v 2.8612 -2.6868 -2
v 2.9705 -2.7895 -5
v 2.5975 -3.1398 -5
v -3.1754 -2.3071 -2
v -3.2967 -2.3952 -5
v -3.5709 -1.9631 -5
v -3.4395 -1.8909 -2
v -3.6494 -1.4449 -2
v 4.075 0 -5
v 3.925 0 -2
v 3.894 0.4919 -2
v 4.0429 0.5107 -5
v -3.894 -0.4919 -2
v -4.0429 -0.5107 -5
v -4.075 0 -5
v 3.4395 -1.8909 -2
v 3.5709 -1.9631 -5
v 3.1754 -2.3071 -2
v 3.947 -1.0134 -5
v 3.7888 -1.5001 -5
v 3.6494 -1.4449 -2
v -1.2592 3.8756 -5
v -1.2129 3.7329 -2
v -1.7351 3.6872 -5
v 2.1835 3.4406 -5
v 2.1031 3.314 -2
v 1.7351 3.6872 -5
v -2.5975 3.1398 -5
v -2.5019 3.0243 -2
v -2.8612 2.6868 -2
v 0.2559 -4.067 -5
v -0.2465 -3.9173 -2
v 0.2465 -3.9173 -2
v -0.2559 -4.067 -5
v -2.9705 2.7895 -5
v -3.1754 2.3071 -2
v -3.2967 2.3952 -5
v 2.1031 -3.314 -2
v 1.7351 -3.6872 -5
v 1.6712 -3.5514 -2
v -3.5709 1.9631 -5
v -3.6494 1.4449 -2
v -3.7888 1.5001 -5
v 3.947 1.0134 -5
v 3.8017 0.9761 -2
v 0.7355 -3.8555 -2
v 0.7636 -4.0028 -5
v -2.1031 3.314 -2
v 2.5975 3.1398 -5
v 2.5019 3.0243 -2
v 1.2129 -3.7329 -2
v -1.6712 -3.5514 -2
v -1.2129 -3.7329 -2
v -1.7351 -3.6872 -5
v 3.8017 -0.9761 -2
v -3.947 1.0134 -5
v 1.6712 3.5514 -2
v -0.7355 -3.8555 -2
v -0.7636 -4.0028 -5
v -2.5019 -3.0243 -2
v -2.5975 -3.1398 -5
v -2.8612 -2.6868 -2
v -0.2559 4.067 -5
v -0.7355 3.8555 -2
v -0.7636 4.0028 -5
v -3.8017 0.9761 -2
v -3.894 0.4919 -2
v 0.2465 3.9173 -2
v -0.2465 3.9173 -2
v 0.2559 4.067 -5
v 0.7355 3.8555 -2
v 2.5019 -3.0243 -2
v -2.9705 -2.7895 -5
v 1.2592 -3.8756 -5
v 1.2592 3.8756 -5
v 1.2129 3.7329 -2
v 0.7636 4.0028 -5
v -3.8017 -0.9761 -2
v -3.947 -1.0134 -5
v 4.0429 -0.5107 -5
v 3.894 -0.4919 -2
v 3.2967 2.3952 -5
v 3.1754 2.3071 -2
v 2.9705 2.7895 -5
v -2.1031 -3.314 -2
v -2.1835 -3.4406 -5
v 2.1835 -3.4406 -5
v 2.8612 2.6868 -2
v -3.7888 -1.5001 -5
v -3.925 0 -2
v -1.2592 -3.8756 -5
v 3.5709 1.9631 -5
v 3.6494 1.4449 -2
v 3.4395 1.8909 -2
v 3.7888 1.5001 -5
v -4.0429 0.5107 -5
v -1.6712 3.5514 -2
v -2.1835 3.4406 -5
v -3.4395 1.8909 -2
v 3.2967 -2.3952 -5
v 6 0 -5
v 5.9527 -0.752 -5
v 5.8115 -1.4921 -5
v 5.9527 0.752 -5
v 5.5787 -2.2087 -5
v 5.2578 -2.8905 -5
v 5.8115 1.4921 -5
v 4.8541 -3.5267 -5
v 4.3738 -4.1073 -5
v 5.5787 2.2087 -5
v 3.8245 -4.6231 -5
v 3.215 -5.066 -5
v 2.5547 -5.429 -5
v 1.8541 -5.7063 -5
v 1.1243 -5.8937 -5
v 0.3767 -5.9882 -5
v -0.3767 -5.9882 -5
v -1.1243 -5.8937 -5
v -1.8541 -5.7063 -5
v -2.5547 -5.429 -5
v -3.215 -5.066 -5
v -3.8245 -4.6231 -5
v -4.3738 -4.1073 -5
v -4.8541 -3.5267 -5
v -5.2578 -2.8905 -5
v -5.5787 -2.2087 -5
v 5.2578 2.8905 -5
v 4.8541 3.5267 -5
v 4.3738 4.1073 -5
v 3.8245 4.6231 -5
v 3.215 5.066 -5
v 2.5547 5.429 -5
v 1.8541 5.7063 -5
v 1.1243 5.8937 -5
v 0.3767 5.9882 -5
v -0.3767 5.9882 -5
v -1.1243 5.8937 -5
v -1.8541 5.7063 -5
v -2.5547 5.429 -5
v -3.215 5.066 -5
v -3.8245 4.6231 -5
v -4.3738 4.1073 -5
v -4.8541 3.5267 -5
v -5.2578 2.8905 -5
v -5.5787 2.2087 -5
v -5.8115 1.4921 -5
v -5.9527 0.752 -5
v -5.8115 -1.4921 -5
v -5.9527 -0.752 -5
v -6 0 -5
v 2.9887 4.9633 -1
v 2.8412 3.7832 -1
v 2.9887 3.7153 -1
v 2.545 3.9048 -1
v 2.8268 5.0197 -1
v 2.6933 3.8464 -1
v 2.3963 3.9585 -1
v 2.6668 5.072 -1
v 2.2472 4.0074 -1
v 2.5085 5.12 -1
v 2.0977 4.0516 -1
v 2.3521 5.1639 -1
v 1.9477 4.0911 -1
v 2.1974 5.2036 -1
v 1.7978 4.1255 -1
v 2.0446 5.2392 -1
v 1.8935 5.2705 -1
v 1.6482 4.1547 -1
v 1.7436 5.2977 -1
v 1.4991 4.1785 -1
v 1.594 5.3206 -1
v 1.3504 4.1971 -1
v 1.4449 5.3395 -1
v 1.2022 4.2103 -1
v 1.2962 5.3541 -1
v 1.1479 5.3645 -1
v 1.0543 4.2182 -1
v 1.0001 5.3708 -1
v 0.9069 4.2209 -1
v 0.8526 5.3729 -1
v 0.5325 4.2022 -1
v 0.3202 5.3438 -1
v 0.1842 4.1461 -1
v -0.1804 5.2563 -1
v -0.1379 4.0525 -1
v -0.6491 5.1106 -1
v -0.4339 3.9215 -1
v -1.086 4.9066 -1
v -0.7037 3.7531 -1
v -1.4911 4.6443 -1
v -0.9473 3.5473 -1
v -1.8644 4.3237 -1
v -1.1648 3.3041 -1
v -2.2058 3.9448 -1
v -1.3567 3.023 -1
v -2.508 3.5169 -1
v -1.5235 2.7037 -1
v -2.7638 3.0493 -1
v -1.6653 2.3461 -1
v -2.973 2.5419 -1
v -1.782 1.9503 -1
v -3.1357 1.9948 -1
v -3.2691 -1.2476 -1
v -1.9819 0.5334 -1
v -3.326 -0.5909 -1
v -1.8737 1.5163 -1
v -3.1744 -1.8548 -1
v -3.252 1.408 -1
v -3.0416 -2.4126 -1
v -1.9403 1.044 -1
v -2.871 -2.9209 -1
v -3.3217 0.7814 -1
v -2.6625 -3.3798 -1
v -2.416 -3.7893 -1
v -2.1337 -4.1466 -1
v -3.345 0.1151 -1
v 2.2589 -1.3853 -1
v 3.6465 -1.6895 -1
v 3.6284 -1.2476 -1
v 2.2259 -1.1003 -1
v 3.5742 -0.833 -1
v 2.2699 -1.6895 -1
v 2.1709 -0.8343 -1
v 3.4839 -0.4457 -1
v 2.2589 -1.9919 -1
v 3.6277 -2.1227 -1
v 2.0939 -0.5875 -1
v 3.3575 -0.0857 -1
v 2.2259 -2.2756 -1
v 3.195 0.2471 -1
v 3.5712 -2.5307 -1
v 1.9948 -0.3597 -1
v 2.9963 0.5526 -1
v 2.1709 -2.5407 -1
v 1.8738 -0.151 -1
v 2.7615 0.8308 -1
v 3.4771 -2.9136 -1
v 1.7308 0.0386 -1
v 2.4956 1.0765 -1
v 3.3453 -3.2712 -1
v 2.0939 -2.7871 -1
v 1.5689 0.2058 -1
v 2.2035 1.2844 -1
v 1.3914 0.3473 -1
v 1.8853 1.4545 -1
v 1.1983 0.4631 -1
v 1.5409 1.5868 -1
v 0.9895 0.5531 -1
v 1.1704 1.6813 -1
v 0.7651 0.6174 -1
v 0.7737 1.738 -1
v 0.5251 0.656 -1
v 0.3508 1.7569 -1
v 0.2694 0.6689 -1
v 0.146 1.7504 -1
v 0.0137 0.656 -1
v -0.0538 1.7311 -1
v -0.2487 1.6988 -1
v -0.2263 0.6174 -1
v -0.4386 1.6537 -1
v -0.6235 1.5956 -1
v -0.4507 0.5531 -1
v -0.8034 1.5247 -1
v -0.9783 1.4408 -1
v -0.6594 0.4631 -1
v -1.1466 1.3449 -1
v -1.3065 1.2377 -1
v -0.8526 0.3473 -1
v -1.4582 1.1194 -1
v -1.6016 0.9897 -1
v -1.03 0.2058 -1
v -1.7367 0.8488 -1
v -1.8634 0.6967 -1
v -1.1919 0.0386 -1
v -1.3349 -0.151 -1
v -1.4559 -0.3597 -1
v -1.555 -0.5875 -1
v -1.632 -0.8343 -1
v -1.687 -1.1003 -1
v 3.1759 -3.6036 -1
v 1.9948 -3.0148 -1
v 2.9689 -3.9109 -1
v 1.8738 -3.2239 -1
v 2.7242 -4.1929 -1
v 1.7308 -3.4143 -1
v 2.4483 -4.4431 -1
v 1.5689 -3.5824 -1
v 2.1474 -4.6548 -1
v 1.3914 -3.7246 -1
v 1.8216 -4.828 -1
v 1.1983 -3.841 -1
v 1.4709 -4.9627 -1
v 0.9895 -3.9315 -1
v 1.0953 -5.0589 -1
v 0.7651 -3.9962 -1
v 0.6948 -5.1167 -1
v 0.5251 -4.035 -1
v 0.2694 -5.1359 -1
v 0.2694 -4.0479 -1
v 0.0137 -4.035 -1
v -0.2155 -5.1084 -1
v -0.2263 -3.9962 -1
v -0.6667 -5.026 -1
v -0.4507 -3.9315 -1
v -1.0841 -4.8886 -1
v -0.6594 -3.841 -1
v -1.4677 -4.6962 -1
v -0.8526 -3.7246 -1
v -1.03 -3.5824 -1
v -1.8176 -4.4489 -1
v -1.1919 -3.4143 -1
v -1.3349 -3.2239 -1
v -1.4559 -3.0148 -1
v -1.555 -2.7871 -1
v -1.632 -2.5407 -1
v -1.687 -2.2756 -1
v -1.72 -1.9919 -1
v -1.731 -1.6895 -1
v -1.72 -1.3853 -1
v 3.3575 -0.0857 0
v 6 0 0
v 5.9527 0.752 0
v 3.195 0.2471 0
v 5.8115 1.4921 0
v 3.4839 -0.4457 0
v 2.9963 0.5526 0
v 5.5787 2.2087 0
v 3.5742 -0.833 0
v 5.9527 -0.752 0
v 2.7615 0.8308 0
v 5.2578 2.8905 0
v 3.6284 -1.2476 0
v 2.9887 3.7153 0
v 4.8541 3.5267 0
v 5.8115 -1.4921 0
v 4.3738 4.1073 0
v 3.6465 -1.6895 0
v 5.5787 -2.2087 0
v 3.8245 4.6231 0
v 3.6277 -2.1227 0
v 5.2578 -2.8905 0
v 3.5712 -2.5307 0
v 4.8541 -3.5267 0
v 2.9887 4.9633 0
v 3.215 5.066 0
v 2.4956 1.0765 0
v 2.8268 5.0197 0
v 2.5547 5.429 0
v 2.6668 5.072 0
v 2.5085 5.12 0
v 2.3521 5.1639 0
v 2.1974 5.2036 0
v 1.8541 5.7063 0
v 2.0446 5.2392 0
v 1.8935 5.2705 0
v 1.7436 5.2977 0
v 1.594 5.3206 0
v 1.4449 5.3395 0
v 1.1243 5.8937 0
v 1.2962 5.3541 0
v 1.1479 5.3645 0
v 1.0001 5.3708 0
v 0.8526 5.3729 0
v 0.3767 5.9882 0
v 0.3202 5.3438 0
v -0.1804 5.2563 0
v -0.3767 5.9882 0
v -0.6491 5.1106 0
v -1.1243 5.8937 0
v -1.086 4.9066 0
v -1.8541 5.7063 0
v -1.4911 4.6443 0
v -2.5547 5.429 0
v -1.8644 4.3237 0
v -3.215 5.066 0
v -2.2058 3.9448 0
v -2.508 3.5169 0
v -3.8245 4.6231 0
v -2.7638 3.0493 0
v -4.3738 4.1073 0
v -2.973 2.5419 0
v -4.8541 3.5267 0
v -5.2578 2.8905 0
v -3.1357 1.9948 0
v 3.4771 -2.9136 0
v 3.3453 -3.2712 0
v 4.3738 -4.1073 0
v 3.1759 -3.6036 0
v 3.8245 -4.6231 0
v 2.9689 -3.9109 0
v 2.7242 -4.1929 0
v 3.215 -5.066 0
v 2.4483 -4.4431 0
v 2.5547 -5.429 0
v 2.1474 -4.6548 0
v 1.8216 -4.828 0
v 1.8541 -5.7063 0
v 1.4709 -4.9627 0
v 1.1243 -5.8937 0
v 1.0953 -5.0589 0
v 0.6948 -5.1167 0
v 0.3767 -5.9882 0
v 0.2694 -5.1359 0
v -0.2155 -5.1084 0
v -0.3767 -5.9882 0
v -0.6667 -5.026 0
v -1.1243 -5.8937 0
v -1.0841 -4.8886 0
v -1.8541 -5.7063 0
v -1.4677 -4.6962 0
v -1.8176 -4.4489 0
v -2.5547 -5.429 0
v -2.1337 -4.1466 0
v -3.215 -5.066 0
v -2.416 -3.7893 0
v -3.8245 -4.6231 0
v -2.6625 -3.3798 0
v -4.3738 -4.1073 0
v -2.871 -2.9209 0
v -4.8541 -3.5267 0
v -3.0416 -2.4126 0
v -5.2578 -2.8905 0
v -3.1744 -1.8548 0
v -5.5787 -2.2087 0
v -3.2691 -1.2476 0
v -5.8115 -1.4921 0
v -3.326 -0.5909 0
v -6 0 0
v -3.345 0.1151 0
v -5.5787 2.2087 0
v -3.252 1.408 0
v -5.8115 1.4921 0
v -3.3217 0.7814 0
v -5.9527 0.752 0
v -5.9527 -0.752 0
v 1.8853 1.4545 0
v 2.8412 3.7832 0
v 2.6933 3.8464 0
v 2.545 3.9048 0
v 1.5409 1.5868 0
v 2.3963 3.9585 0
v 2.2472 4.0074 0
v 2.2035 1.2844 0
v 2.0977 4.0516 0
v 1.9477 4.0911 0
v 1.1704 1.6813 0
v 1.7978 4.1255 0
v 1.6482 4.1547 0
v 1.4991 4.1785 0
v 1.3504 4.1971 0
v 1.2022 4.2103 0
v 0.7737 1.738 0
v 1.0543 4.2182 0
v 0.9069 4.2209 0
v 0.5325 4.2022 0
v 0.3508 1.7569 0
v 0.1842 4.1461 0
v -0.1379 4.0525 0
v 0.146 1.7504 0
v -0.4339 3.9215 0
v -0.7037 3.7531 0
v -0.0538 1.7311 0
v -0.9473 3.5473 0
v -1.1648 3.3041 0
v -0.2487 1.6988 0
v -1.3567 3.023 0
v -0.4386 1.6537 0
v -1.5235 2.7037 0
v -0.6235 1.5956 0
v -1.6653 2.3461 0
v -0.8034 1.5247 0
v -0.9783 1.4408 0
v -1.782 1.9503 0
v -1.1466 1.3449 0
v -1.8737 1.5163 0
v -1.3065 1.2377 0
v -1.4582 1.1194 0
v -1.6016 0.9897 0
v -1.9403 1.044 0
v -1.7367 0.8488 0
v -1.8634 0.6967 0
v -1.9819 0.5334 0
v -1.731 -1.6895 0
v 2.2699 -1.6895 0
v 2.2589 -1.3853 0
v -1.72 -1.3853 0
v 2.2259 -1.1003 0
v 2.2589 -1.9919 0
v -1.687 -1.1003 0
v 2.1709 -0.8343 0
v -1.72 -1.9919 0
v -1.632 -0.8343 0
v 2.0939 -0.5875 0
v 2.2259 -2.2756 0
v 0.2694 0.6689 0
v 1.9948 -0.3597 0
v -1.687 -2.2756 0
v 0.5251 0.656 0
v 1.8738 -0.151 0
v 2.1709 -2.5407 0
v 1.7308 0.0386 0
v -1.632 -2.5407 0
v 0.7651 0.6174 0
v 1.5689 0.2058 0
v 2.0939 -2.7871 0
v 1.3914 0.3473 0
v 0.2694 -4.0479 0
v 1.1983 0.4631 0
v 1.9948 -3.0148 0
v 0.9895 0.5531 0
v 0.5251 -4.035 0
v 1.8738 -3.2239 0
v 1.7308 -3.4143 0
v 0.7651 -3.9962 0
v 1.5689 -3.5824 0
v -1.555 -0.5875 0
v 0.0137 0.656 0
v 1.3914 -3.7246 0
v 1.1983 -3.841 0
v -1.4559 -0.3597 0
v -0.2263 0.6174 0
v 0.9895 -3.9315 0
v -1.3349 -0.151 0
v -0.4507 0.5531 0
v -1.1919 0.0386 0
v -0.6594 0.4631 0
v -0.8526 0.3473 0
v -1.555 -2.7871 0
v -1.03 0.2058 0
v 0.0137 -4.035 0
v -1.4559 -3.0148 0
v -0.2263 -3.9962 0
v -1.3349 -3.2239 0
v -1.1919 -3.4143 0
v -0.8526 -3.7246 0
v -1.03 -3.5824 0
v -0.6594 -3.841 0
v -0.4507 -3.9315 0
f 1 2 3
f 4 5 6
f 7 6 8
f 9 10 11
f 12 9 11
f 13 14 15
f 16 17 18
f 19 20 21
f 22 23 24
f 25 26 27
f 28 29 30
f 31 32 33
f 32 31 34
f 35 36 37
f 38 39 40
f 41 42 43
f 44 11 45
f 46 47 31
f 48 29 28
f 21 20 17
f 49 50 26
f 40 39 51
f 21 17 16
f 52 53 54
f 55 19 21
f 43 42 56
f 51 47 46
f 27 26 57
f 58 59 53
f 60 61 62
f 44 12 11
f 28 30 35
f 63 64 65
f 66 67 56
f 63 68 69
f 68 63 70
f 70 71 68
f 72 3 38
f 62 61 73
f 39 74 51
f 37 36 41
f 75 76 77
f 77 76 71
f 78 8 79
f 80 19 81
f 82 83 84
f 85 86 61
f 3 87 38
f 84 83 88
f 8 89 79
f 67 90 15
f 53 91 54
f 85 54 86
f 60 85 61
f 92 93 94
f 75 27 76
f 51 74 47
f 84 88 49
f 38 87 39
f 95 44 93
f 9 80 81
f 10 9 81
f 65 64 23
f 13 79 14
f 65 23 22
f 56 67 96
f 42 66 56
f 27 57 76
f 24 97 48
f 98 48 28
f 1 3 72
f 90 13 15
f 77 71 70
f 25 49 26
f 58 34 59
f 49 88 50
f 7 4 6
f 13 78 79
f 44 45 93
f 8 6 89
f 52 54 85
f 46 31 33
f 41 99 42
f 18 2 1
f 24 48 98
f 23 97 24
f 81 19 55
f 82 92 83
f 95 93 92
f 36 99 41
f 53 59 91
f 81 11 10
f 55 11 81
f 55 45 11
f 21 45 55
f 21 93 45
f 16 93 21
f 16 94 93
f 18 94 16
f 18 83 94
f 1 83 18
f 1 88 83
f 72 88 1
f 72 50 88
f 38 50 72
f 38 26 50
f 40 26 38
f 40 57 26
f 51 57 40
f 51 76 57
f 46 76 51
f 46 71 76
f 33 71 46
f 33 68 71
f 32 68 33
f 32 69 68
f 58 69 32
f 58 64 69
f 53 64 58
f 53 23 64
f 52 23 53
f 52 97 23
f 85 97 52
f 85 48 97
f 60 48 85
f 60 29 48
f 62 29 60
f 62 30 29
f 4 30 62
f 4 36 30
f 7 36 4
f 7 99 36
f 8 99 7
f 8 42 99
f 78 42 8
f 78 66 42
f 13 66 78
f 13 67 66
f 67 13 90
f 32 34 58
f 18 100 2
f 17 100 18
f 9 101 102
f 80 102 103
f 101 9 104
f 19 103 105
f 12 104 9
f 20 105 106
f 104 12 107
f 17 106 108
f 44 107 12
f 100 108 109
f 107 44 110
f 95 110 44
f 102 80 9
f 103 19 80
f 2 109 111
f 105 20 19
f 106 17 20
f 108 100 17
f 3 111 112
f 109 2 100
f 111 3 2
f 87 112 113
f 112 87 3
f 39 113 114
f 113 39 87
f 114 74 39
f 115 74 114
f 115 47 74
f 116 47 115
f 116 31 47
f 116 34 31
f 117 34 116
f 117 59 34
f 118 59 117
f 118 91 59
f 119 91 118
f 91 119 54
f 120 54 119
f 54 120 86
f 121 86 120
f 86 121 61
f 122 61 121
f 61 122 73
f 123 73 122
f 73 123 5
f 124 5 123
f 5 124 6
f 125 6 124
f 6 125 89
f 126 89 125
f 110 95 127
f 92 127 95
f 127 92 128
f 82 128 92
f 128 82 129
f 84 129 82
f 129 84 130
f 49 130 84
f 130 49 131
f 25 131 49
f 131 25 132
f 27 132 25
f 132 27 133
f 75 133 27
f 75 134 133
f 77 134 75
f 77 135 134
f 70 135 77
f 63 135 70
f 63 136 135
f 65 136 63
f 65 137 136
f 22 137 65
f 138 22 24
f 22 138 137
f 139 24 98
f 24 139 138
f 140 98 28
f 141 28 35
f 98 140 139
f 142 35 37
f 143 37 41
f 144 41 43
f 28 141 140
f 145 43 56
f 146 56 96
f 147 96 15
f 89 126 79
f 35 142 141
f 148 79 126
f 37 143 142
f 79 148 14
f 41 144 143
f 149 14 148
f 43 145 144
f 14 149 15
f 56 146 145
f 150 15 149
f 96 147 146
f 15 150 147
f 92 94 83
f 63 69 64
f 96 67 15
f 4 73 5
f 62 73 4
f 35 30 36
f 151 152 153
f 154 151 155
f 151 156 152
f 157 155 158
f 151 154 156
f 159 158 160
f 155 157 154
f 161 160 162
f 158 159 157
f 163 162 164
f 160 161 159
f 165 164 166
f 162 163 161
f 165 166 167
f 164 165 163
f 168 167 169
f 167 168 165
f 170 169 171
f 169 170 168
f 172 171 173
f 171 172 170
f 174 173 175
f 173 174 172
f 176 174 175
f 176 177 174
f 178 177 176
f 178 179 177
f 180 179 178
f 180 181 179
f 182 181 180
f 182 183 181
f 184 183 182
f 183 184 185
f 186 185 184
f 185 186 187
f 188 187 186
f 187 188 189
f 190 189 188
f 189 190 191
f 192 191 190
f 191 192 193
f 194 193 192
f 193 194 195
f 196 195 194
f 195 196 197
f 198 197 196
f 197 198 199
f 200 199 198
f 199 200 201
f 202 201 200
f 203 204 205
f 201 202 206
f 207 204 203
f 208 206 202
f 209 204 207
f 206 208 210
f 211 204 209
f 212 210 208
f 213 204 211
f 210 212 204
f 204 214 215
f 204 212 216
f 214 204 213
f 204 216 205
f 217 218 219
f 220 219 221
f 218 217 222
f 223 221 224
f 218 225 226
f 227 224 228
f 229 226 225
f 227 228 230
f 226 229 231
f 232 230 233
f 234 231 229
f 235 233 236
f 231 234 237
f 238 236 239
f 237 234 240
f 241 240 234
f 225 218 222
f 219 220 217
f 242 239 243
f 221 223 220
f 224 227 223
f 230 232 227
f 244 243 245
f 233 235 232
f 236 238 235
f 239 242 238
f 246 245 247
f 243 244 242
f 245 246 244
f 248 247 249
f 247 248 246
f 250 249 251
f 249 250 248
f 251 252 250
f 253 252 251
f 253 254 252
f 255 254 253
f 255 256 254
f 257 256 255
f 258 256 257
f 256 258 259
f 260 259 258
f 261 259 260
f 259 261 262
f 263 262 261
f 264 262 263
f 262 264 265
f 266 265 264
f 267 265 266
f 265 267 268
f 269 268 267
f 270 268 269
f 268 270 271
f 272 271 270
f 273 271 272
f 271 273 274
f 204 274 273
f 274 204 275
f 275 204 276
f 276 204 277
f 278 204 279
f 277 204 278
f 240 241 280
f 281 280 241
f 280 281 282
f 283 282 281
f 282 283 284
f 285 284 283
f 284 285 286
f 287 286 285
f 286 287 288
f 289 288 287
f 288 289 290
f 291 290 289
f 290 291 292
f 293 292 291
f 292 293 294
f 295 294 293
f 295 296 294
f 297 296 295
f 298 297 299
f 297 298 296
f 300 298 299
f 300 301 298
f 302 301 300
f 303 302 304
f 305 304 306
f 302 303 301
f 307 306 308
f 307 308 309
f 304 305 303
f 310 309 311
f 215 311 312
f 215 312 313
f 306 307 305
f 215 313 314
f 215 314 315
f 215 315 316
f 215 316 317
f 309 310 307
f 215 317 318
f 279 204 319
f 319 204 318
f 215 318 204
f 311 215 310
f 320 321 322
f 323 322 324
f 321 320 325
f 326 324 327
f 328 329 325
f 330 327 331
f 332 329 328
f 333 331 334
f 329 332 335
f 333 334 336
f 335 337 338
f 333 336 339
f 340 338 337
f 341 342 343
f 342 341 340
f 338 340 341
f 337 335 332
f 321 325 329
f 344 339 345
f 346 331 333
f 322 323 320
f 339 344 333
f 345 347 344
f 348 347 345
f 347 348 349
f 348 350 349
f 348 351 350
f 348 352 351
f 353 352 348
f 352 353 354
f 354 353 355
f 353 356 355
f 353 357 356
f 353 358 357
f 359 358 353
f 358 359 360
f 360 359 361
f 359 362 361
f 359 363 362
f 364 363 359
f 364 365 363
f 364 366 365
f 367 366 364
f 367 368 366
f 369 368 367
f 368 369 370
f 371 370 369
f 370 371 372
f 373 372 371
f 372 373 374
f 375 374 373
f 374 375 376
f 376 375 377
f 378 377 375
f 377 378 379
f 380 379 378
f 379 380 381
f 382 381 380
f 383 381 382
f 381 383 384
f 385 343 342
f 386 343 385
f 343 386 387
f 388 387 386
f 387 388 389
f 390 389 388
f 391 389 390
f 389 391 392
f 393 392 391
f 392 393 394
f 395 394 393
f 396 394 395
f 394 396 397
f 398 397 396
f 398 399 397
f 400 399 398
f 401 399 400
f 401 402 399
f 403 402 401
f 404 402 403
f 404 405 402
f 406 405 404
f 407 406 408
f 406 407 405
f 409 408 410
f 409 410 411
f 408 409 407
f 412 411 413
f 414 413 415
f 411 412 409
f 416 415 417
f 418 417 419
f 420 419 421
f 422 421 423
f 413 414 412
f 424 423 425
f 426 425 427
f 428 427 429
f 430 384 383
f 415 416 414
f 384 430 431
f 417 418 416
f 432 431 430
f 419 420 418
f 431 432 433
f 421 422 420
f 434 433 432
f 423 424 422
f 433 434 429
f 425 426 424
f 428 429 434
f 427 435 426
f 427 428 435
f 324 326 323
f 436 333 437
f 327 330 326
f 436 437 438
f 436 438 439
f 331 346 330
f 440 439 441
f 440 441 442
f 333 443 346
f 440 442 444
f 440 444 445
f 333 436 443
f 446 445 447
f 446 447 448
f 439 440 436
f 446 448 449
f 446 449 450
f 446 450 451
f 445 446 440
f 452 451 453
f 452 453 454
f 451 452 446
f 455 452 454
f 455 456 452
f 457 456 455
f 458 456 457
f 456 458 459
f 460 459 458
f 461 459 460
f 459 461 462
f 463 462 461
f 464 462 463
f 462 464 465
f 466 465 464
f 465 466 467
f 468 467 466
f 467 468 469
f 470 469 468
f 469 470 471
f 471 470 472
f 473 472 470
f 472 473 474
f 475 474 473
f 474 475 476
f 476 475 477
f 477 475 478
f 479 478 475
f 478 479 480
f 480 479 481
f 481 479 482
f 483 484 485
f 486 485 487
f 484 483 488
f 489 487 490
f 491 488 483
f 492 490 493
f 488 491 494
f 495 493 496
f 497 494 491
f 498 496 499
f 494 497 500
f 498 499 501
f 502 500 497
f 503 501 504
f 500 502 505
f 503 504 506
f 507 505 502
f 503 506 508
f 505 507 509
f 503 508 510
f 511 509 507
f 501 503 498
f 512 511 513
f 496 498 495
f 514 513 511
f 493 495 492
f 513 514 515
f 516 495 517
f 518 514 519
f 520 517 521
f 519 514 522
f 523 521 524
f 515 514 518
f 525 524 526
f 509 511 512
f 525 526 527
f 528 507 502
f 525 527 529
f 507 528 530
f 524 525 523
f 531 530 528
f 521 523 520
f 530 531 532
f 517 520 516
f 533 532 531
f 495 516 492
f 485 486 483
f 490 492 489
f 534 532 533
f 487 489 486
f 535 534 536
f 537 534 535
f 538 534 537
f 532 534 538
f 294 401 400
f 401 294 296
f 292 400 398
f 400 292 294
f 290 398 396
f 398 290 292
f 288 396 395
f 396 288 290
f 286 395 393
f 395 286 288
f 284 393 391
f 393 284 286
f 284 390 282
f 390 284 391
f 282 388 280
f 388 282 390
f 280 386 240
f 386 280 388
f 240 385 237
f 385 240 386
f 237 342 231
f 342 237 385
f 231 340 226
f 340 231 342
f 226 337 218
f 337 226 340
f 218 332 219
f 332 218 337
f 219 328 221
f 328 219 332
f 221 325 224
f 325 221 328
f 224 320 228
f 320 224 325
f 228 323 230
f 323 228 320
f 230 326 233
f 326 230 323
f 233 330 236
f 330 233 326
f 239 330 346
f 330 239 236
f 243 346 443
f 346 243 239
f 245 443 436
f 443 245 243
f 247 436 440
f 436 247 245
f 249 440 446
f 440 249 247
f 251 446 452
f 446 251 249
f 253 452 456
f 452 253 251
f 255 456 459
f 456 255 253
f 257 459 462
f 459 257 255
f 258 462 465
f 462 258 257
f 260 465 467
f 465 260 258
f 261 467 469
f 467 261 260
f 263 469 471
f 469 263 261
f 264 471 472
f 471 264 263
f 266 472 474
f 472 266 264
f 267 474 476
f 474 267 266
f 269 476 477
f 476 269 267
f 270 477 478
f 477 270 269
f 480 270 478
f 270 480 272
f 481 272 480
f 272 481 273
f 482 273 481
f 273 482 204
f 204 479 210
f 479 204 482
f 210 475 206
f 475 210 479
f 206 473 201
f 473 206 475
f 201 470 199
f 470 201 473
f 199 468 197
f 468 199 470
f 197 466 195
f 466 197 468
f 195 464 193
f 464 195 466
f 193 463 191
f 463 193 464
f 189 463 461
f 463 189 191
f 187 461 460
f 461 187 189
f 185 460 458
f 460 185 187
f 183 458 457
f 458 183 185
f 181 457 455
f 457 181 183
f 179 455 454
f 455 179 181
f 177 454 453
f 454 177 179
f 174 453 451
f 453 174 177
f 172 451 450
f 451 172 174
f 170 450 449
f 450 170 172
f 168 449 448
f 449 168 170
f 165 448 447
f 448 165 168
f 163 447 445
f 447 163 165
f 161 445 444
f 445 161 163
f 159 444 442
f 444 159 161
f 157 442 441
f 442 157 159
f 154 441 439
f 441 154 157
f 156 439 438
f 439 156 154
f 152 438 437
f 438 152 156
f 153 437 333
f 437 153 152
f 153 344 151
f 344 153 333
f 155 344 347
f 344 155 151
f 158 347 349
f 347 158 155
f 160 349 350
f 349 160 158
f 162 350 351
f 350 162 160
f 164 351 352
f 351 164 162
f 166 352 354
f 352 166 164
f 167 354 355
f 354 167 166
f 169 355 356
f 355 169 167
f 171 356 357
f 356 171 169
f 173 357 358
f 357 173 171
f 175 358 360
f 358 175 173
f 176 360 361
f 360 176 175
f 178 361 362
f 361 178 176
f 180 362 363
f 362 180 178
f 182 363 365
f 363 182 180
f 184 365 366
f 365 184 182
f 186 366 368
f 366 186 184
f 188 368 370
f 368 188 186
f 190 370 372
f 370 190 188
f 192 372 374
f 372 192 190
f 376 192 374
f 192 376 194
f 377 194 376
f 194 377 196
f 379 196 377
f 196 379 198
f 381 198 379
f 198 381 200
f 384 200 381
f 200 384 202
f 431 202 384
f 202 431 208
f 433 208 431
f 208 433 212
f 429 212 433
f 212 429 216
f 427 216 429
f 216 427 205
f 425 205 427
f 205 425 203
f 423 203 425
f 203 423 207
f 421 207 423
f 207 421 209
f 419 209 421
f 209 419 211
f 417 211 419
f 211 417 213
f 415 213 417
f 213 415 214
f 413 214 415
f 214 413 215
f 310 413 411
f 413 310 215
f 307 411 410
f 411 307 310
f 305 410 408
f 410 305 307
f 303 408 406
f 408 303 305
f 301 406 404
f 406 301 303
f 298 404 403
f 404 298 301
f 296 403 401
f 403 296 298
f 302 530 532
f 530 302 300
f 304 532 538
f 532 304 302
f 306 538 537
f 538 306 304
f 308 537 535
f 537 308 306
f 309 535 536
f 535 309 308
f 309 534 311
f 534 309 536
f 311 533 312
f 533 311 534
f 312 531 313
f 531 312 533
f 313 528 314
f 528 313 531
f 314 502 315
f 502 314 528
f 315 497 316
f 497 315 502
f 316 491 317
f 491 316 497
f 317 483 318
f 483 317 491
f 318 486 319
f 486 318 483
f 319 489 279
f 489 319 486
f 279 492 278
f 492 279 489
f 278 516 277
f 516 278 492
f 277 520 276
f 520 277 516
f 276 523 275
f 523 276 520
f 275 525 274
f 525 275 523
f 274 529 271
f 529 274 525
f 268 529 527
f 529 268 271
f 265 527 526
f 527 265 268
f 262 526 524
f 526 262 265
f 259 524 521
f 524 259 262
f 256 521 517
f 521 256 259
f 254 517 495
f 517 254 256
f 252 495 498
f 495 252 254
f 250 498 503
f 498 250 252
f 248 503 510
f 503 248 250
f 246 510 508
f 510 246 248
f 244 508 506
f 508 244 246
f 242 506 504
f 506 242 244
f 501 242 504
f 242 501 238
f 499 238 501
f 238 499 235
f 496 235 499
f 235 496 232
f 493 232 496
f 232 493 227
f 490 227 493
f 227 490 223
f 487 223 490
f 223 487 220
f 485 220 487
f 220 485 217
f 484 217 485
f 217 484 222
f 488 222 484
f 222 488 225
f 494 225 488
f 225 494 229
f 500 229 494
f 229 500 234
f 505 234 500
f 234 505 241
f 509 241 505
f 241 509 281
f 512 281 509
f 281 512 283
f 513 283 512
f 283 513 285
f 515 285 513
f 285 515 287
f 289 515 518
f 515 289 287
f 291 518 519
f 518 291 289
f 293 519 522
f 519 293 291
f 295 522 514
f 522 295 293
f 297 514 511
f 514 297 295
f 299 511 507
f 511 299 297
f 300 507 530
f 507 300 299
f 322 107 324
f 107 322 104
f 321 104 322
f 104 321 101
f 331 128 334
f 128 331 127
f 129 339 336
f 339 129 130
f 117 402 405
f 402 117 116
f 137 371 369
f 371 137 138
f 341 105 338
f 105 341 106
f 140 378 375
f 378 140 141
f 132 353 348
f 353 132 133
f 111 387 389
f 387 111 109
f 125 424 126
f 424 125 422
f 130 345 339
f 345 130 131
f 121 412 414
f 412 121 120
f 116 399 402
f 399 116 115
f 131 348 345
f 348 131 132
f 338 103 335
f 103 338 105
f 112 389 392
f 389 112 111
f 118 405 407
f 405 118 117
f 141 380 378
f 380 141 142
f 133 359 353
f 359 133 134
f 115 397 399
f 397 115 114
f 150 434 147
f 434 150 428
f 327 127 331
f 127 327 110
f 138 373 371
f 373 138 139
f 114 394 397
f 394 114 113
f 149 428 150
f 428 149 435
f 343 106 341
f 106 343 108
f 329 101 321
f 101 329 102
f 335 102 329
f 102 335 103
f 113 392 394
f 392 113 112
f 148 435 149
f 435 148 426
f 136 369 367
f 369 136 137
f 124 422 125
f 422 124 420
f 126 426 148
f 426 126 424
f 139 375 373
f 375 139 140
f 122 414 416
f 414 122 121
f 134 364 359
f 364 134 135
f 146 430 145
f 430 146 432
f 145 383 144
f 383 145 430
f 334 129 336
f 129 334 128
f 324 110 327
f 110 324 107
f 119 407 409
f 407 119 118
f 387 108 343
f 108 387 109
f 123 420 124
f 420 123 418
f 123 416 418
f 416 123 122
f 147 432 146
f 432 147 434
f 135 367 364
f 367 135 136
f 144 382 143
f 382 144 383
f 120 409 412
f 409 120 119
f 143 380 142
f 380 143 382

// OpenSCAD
$fn = 50;

difference() {
	union() {
		translate(v = [0, 0, -5.0]) {
			cylinder(h = 5, r = 6.0);
		}
	}
	union() {
		#translate(v = [0, 0, -5.0]) {
			cylinder(h = 3, r1 = 4.075, r2 = 3.925);
		}
		translate(v = [0, 0, -1]) {
			linear_extrude(height = 1) {
				text(font = "Impact", halign = "center", size = 10, text = "6", valign = "center");
			}
		}
	}
}
